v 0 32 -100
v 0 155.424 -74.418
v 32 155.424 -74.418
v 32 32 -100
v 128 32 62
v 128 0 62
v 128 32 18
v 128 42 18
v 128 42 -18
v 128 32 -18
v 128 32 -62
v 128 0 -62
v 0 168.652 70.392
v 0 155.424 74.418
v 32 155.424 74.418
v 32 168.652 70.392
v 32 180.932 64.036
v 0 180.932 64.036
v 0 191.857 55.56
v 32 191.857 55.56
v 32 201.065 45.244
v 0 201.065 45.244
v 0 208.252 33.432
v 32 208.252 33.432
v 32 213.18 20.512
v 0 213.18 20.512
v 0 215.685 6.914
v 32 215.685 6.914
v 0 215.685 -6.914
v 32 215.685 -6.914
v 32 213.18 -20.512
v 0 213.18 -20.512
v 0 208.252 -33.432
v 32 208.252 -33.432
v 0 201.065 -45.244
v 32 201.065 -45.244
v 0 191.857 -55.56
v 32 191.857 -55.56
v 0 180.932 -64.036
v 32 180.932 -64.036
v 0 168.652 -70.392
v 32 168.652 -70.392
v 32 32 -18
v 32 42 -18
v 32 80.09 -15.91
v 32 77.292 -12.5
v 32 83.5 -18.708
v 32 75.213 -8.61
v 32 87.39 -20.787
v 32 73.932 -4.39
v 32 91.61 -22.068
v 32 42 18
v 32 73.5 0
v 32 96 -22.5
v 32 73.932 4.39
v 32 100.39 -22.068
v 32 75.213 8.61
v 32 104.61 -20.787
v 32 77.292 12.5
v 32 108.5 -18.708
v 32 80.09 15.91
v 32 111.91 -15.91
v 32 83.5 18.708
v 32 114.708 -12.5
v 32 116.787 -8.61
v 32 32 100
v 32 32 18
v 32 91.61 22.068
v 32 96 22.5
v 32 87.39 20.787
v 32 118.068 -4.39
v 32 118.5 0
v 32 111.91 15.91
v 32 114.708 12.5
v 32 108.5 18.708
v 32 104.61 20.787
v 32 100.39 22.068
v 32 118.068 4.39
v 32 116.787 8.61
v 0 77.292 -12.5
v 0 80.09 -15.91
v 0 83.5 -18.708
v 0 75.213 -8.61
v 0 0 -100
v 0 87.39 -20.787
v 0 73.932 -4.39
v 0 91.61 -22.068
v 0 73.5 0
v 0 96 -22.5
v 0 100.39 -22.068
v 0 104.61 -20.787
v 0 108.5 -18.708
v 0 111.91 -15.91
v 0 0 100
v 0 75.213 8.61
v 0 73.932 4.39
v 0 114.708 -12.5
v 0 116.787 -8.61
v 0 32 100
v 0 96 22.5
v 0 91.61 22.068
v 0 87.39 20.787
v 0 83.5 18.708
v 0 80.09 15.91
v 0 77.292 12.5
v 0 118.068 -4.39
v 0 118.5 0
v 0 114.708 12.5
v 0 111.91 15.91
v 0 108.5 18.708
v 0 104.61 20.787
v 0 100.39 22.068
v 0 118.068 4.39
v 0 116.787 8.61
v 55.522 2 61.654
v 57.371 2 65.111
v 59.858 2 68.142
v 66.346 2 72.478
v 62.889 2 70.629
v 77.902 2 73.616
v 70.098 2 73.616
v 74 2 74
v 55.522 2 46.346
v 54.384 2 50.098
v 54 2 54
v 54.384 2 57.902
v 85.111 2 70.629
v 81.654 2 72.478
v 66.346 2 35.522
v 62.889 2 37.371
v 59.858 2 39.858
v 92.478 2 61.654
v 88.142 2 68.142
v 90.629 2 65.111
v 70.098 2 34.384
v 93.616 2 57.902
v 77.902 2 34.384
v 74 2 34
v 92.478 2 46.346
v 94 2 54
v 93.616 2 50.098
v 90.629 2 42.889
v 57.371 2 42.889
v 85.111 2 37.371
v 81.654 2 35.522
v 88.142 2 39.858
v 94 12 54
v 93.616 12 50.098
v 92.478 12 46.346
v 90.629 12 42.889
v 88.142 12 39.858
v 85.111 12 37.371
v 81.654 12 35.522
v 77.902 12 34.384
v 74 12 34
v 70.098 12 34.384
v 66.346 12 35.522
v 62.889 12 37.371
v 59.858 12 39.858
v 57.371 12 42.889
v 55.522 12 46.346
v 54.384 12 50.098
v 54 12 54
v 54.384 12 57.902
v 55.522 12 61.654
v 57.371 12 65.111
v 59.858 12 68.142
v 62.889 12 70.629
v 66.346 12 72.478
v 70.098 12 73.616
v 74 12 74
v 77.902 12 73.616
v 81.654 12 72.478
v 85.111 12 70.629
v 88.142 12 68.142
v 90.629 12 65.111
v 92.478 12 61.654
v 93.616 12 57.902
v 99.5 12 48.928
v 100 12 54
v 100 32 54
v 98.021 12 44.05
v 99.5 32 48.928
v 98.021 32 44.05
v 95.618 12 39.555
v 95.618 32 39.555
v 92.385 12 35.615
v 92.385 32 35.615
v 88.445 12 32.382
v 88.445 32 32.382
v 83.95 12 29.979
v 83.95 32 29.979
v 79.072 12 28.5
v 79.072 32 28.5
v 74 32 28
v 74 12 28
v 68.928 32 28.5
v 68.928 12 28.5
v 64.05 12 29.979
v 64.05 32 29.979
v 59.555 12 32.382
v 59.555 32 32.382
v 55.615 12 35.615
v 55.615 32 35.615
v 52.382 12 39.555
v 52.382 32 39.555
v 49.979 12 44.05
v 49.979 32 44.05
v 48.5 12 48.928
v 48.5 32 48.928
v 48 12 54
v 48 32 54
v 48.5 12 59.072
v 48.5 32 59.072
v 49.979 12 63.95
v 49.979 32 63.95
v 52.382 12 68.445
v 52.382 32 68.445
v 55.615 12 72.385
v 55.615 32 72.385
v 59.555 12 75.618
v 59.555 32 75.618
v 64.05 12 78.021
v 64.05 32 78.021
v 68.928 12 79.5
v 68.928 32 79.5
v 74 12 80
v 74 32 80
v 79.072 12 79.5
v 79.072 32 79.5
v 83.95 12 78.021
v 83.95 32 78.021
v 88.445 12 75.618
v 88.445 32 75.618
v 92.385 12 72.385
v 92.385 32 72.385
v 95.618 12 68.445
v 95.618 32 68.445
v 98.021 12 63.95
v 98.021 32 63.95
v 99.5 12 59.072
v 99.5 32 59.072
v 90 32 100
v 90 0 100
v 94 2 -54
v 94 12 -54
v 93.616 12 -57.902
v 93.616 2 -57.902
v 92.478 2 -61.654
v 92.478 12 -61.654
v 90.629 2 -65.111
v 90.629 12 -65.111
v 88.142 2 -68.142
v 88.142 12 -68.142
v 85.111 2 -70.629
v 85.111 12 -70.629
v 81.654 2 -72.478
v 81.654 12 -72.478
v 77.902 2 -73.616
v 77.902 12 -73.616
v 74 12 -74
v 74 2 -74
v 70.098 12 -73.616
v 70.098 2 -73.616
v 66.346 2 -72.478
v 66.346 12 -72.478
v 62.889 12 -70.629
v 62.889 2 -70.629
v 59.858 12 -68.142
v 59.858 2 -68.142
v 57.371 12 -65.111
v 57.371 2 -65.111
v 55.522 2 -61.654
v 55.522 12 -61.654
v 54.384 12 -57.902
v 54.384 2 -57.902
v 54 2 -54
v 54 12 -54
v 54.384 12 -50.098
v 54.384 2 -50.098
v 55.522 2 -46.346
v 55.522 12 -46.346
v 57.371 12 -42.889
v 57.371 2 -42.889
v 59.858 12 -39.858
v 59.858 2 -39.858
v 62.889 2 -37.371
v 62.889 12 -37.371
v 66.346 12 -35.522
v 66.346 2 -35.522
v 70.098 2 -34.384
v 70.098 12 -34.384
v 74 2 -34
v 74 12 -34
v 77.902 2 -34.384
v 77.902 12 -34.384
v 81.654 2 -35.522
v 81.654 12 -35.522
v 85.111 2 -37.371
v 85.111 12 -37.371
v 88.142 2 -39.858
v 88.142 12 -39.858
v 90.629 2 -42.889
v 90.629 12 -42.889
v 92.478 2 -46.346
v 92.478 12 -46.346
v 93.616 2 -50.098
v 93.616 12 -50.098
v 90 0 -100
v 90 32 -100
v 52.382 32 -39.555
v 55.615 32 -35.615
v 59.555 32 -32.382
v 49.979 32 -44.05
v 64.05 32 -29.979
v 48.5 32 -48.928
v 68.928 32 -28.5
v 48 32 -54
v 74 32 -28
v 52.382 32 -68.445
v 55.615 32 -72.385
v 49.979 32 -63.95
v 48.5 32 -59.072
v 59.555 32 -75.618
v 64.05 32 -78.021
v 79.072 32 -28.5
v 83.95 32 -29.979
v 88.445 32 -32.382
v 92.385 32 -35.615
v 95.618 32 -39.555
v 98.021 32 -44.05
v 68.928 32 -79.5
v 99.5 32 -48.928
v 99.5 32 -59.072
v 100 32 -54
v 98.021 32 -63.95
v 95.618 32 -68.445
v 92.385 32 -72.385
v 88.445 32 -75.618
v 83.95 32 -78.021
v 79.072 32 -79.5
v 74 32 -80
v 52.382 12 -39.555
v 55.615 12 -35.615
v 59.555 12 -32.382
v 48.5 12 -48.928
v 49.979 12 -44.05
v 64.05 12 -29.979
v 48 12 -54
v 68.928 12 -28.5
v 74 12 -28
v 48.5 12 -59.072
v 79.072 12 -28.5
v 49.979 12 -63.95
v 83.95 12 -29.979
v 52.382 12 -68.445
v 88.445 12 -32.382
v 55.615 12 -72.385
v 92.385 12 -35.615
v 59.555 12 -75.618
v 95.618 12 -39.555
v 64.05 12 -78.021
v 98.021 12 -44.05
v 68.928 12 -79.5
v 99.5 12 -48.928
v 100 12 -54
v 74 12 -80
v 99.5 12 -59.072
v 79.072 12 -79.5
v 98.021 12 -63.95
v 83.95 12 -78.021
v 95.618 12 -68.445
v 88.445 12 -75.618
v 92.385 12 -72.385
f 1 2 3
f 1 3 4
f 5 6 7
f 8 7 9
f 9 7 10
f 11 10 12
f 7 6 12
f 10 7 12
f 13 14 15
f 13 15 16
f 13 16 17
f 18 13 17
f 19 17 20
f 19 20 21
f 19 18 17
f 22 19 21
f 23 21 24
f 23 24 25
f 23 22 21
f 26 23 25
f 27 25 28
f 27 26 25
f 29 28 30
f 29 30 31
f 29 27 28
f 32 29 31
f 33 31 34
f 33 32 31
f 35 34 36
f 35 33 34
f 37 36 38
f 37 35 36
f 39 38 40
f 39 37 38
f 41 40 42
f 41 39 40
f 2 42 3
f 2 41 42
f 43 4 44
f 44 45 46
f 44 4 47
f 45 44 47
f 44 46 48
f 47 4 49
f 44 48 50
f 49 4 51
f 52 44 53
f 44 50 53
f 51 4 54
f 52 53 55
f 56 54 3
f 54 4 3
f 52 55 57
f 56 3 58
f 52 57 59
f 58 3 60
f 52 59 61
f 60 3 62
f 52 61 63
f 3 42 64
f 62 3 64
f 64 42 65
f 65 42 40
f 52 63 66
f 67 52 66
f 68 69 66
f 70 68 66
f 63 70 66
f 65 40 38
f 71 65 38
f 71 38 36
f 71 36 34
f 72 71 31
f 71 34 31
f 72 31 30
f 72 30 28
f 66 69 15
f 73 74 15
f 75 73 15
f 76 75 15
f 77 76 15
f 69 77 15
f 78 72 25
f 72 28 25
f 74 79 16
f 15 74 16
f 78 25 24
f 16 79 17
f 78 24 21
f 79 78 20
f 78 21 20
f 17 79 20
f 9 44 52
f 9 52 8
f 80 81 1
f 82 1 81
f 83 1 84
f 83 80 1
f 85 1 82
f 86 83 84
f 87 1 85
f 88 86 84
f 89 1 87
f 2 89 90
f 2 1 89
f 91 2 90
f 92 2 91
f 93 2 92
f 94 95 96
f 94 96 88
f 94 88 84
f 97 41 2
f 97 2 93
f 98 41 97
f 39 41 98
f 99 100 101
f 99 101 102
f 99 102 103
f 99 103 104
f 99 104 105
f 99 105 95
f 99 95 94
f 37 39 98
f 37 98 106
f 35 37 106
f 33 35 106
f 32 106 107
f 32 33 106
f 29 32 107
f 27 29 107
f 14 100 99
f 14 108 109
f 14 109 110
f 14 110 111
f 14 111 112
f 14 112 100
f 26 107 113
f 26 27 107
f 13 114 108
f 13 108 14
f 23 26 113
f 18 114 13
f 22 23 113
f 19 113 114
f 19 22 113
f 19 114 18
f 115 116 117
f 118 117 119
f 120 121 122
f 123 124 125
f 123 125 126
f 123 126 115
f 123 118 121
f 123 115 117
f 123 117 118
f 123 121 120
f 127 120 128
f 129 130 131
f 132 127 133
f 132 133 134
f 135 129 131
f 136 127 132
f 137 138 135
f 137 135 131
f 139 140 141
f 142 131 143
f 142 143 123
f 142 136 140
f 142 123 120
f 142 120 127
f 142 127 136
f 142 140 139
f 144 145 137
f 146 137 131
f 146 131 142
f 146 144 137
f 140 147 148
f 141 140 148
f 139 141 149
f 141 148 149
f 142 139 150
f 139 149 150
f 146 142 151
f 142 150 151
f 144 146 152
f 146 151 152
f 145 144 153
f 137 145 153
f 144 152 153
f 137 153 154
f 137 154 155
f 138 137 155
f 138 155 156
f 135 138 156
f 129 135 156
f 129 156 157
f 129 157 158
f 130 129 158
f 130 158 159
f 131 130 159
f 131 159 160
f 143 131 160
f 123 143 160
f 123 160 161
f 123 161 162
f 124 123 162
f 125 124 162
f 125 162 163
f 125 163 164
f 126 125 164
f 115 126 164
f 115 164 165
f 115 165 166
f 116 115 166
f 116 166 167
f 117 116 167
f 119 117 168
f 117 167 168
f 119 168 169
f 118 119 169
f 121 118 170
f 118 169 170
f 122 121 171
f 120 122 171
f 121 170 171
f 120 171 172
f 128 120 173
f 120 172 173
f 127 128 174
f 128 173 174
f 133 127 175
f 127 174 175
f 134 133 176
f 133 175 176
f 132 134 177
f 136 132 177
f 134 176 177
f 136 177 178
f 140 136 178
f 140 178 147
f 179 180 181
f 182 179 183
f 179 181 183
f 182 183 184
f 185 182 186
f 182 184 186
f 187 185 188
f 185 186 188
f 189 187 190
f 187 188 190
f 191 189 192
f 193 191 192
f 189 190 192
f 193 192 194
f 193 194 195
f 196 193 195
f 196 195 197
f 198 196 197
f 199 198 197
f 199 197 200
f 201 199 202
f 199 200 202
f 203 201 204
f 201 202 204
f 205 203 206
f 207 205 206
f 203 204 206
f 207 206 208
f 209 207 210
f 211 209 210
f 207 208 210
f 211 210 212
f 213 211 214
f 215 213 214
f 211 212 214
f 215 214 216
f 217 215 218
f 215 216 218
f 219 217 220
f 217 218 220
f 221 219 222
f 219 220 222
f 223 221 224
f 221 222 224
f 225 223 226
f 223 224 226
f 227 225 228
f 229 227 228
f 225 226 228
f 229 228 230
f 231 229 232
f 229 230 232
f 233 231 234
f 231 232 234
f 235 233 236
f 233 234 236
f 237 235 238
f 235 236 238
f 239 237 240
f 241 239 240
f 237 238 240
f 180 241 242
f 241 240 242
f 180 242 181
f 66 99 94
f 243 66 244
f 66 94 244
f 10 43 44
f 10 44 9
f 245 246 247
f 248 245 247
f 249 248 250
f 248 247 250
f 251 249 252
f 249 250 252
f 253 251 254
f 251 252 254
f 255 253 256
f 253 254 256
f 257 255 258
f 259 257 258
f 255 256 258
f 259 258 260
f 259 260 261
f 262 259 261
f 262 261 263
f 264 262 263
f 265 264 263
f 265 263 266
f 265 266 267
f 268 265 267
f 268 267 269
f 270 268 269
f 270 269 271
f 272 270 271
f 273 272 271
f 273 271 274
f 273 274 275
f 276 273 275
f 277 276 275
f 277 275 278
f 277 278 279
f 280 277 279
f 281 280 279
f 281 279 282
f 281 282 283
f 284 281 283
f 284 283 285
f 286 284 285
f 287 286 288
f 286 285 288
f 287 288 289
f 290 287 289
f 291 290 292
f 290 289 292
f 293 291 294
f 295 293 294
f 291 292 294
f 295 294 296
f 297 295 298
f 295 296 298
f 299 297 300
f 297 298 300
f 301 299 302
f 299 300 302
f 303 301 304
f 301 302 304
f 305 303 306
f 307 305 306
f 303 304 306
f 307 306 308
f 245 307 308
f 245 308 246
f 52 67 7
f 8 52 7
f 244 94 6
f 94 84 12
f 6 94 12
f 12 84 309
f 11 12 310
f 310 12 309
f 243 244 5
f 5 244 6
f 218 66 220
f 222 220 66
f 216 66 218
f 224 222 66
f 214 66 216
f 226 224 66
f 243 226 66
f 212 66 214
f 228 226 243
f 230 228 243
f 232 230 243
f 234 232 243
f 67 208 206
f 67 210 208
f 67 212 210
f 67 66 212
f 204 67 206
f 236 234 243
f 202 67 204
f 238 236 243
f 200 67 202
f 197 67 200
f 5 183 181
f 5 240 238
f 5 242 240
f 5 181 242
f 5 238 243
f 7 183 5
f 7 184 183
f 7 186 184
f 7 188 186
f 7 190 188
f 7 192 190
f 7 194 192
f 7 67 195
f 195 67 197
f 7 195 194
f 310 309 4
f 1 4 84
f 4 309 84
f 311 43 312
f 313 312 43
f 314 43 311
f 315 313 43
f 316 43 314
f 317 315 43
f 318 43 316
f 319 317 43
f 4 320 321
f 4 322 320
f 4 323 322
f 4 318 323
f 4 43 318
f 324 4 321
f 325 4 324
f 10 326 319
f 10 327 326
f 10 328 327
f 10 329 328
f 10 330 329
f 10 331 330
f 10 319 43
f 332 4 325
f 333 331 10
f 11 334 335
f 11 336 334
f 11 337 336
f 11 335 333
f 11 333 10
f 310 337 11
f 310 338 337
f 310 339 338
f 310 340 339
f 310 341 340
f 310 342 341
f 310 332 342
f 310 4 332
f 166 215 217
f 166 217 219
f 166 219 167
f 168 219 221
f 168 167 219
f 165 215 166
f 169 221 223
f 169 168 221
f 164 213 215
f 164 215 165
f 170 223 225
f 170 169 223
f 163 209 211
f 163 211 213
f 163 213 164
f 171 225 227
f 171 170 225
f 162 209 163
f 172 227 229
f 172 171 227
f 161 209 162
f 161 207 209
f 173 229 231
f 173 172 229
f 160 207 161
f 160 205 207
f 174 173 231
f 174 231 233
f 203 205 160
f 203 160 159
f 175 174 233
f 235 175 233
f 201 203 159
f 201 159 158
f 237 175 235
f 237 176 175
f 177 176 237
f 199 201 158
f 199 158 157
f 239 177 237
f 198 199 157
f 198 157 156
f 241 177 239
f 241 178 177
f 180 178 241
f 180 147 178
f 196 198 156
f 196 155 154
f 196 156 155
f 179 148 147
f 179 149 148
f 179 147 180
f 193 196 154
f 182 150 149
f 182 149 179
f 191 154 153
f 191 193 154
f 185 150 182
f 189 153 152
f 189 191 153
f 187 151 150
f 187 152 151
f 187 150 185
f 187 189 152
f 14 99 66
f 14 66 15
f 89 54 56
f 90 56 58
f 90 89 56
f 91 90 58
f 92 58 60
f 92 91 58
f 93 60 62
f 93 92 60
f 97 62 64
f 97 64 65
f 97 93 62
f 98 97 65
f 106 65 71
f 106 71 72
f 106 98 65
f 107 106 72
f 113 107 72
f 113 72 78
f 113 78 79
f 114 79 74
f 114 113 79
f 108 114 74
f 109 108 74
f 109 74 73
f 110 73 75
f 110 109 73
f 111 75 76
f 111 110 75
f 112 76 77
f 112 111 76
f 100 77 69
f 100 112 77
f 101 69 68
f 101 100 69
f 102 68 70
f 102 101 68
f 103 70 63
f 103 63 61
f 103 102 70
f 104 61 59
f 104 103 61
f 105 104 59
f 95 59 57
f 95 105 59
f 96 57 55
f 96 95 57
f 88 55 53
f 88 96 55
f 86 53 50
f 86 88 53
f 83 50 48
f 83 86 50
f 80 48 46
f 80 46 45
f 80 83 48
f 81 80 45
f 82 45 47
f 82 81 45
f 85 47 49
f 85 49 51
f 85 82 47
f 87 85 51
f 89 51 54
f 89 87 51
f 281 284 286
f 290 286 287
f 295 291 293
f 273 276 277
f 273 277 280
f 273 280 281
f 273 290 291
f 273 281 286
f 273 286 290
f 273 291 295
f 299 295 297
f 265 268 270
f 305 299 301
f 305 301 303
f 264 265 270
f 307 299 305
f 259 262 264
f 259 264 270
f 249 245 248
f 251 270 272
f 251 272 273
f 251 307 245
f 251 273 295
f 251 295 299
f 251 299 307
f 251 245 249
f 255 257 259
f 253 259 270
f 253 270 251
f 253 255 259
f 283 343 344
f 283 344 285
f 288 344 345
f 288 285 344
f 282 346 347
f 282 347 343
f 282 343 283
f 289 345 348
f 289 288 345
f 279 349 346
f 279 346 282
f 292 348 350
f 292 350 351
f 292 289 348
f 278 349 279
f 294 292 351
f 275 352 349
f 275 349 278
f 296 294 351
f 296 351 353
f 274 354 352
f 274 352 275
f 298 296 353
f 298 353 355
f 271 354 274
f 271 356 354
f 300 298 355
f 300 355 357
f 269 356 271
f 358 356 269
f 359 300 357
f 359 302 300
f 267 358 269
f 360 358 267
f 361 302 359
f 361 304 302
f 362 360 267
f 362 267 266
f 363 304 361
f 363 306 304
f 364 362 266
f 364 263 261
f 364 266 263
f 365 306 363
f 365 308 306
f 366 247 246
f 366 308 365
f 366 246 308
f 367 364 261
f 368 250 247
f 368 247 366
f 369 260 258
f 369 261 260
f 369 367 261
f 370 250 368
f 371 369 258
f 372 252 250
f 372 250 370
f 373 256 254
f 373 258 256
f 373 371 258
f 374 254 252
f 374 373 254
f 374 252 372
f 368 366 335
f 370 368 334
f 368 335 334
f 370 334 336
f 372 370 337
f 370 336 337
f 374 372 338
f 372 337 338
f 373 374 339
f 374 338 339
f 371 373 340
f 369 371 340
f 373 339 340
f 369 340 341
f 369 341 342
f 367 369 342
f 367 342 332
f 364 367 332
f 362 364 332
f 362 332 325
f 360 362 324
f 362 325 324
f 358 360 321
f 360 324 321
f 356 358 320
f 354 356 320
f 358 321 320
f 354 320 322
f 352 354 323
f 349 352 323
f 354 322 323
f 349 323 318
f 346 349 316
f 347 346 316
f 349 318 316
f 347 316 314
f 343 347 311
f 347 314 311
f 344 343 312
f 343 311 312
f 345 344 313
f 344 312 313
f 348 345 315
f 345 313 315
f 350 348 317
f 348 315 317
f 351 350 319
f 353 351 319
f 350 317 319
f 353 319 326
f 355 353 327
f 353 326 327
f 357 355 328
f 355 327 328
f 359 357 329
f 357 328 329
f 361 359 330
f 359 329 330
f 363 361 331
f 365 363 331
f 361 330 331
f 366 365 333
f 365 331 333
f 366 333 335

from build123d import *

# Parameters (mm, degrees)
BOSS_EXTRUDE1_DEPTH   = 32
BOSS_EXTRUDE1_2_DEPTH = 32
SKETCH1_3_W           = 128
SKETCH1_3_H           = 36
BOSS_EXTRUDE2_DEPTH   = 42
SKETCH2_R             = 22.5
BOSS_EXTRUDE3_DEPTH   = 32
SKETCH4_R             = 26
CUT_EXTRUDE1_DEPTH    = 20
SKETCH4_3_R           = 20
CUT_EXTRUDE2_DEPTH    = 30


with BuildPart() as part:
    # Sketch1 → Boss-Extrude1 (new body)
    with BuildSketch(Plane(origin=(0, 0, 0), x_dir=(1, 0, 0), z_dir=(0, 1, 0))):
        Polygon((0, -18), (0, -100), (90, -100), (128, -62), (128, -18), align=None)
    extrude(amount=BOSS_EXTRUDE1_DEPTH)



with BuildPart() as body_2:
    # Sketch1 → Boss-Extrude1 2 (new body)
    with BuildSketch(Plane(origin=(0, 0, 0), x_dir=(1, 0, 0), z_dir=(0, 1, 0))):
        Polygon((0, 100), (0, 18), (128, 18), (128, 62), (90, 100), align=None)
    extrude(amount=BOSS_EXTRUDE1_2_DEPTH)


with BuildPart() as part_1:
    add(part.part)

    add(body_2.part)  # Boss-Extrude2 merges body 2
    # Sketch1<3> → Boss-Extrude2 (add)
    with BuildSketch(Plane(origin=(0, 0, 0), x_dir=(1, 0, 0), z_dir=(0, 1, 0))):
        with Locations((64, 0)):
            Rectangle(SKETCH1_3_W, SKETCH1_3_H)
    extrude(amount=BOSS_EXTRUDE2_DEPTH)

    # Sketch2 → Boss-Extrude3 (add)
    with BuildSketch(Plane(origin=(0, 0, 0), x_dir=(0, 0, -1), z_dir=(1, 0, 0))):
        with BuildLine():
            Line((-100, 32), (-74.418333794, 155.424383143))
            ThreePointArc((-74.418333794, 155.424383143), (0, 216), (74.418333794, 155.424383143))
            Line((74.418333794, 155.424383143), (100, 32))
            Line((100, 32), (-100, 32))
        make_face()
        with Locations((0, 96)):
            Circle(SKETCH2_R, mode=Mode.SUBTRACT)
    extrude(amount=BOSS_EXTRUDE3_DEPTH)

    # Sketch4 → Cut-Extrude1 (cut)
    with BuildSketch(Plane(origin=(0, 32, 0), x_dir=(1, 0, 0), z_dir=(0, 1, 0))):
        with Locations((74, -54)):
            Circle(SKETCH4_R)
        with Locations((74, 54)):
            Circle(SKETCH4_R)
    extrude(amount=-CUT_EXTRUDE1_DEPTH, mode=Mode.SUBTRACT)

    # Sketch4<3> → Cut-Extrude2 (cut)
    with BuildSketch(Plane(origin=(0, 32, 0), x_dir=(1, 0, 0), z_dir=(0, 1, 0))):
        with Locations((74, -54)):
            Circle(SKETCH4_3_R)
        with Locations((74, 54)):
            Circle(SKETCH4_3_R)
    extrude(amount=-CUT_EXTRUDE2_DEPTH, mode=Mode.SUBTRACT)


solid = part_1.part
